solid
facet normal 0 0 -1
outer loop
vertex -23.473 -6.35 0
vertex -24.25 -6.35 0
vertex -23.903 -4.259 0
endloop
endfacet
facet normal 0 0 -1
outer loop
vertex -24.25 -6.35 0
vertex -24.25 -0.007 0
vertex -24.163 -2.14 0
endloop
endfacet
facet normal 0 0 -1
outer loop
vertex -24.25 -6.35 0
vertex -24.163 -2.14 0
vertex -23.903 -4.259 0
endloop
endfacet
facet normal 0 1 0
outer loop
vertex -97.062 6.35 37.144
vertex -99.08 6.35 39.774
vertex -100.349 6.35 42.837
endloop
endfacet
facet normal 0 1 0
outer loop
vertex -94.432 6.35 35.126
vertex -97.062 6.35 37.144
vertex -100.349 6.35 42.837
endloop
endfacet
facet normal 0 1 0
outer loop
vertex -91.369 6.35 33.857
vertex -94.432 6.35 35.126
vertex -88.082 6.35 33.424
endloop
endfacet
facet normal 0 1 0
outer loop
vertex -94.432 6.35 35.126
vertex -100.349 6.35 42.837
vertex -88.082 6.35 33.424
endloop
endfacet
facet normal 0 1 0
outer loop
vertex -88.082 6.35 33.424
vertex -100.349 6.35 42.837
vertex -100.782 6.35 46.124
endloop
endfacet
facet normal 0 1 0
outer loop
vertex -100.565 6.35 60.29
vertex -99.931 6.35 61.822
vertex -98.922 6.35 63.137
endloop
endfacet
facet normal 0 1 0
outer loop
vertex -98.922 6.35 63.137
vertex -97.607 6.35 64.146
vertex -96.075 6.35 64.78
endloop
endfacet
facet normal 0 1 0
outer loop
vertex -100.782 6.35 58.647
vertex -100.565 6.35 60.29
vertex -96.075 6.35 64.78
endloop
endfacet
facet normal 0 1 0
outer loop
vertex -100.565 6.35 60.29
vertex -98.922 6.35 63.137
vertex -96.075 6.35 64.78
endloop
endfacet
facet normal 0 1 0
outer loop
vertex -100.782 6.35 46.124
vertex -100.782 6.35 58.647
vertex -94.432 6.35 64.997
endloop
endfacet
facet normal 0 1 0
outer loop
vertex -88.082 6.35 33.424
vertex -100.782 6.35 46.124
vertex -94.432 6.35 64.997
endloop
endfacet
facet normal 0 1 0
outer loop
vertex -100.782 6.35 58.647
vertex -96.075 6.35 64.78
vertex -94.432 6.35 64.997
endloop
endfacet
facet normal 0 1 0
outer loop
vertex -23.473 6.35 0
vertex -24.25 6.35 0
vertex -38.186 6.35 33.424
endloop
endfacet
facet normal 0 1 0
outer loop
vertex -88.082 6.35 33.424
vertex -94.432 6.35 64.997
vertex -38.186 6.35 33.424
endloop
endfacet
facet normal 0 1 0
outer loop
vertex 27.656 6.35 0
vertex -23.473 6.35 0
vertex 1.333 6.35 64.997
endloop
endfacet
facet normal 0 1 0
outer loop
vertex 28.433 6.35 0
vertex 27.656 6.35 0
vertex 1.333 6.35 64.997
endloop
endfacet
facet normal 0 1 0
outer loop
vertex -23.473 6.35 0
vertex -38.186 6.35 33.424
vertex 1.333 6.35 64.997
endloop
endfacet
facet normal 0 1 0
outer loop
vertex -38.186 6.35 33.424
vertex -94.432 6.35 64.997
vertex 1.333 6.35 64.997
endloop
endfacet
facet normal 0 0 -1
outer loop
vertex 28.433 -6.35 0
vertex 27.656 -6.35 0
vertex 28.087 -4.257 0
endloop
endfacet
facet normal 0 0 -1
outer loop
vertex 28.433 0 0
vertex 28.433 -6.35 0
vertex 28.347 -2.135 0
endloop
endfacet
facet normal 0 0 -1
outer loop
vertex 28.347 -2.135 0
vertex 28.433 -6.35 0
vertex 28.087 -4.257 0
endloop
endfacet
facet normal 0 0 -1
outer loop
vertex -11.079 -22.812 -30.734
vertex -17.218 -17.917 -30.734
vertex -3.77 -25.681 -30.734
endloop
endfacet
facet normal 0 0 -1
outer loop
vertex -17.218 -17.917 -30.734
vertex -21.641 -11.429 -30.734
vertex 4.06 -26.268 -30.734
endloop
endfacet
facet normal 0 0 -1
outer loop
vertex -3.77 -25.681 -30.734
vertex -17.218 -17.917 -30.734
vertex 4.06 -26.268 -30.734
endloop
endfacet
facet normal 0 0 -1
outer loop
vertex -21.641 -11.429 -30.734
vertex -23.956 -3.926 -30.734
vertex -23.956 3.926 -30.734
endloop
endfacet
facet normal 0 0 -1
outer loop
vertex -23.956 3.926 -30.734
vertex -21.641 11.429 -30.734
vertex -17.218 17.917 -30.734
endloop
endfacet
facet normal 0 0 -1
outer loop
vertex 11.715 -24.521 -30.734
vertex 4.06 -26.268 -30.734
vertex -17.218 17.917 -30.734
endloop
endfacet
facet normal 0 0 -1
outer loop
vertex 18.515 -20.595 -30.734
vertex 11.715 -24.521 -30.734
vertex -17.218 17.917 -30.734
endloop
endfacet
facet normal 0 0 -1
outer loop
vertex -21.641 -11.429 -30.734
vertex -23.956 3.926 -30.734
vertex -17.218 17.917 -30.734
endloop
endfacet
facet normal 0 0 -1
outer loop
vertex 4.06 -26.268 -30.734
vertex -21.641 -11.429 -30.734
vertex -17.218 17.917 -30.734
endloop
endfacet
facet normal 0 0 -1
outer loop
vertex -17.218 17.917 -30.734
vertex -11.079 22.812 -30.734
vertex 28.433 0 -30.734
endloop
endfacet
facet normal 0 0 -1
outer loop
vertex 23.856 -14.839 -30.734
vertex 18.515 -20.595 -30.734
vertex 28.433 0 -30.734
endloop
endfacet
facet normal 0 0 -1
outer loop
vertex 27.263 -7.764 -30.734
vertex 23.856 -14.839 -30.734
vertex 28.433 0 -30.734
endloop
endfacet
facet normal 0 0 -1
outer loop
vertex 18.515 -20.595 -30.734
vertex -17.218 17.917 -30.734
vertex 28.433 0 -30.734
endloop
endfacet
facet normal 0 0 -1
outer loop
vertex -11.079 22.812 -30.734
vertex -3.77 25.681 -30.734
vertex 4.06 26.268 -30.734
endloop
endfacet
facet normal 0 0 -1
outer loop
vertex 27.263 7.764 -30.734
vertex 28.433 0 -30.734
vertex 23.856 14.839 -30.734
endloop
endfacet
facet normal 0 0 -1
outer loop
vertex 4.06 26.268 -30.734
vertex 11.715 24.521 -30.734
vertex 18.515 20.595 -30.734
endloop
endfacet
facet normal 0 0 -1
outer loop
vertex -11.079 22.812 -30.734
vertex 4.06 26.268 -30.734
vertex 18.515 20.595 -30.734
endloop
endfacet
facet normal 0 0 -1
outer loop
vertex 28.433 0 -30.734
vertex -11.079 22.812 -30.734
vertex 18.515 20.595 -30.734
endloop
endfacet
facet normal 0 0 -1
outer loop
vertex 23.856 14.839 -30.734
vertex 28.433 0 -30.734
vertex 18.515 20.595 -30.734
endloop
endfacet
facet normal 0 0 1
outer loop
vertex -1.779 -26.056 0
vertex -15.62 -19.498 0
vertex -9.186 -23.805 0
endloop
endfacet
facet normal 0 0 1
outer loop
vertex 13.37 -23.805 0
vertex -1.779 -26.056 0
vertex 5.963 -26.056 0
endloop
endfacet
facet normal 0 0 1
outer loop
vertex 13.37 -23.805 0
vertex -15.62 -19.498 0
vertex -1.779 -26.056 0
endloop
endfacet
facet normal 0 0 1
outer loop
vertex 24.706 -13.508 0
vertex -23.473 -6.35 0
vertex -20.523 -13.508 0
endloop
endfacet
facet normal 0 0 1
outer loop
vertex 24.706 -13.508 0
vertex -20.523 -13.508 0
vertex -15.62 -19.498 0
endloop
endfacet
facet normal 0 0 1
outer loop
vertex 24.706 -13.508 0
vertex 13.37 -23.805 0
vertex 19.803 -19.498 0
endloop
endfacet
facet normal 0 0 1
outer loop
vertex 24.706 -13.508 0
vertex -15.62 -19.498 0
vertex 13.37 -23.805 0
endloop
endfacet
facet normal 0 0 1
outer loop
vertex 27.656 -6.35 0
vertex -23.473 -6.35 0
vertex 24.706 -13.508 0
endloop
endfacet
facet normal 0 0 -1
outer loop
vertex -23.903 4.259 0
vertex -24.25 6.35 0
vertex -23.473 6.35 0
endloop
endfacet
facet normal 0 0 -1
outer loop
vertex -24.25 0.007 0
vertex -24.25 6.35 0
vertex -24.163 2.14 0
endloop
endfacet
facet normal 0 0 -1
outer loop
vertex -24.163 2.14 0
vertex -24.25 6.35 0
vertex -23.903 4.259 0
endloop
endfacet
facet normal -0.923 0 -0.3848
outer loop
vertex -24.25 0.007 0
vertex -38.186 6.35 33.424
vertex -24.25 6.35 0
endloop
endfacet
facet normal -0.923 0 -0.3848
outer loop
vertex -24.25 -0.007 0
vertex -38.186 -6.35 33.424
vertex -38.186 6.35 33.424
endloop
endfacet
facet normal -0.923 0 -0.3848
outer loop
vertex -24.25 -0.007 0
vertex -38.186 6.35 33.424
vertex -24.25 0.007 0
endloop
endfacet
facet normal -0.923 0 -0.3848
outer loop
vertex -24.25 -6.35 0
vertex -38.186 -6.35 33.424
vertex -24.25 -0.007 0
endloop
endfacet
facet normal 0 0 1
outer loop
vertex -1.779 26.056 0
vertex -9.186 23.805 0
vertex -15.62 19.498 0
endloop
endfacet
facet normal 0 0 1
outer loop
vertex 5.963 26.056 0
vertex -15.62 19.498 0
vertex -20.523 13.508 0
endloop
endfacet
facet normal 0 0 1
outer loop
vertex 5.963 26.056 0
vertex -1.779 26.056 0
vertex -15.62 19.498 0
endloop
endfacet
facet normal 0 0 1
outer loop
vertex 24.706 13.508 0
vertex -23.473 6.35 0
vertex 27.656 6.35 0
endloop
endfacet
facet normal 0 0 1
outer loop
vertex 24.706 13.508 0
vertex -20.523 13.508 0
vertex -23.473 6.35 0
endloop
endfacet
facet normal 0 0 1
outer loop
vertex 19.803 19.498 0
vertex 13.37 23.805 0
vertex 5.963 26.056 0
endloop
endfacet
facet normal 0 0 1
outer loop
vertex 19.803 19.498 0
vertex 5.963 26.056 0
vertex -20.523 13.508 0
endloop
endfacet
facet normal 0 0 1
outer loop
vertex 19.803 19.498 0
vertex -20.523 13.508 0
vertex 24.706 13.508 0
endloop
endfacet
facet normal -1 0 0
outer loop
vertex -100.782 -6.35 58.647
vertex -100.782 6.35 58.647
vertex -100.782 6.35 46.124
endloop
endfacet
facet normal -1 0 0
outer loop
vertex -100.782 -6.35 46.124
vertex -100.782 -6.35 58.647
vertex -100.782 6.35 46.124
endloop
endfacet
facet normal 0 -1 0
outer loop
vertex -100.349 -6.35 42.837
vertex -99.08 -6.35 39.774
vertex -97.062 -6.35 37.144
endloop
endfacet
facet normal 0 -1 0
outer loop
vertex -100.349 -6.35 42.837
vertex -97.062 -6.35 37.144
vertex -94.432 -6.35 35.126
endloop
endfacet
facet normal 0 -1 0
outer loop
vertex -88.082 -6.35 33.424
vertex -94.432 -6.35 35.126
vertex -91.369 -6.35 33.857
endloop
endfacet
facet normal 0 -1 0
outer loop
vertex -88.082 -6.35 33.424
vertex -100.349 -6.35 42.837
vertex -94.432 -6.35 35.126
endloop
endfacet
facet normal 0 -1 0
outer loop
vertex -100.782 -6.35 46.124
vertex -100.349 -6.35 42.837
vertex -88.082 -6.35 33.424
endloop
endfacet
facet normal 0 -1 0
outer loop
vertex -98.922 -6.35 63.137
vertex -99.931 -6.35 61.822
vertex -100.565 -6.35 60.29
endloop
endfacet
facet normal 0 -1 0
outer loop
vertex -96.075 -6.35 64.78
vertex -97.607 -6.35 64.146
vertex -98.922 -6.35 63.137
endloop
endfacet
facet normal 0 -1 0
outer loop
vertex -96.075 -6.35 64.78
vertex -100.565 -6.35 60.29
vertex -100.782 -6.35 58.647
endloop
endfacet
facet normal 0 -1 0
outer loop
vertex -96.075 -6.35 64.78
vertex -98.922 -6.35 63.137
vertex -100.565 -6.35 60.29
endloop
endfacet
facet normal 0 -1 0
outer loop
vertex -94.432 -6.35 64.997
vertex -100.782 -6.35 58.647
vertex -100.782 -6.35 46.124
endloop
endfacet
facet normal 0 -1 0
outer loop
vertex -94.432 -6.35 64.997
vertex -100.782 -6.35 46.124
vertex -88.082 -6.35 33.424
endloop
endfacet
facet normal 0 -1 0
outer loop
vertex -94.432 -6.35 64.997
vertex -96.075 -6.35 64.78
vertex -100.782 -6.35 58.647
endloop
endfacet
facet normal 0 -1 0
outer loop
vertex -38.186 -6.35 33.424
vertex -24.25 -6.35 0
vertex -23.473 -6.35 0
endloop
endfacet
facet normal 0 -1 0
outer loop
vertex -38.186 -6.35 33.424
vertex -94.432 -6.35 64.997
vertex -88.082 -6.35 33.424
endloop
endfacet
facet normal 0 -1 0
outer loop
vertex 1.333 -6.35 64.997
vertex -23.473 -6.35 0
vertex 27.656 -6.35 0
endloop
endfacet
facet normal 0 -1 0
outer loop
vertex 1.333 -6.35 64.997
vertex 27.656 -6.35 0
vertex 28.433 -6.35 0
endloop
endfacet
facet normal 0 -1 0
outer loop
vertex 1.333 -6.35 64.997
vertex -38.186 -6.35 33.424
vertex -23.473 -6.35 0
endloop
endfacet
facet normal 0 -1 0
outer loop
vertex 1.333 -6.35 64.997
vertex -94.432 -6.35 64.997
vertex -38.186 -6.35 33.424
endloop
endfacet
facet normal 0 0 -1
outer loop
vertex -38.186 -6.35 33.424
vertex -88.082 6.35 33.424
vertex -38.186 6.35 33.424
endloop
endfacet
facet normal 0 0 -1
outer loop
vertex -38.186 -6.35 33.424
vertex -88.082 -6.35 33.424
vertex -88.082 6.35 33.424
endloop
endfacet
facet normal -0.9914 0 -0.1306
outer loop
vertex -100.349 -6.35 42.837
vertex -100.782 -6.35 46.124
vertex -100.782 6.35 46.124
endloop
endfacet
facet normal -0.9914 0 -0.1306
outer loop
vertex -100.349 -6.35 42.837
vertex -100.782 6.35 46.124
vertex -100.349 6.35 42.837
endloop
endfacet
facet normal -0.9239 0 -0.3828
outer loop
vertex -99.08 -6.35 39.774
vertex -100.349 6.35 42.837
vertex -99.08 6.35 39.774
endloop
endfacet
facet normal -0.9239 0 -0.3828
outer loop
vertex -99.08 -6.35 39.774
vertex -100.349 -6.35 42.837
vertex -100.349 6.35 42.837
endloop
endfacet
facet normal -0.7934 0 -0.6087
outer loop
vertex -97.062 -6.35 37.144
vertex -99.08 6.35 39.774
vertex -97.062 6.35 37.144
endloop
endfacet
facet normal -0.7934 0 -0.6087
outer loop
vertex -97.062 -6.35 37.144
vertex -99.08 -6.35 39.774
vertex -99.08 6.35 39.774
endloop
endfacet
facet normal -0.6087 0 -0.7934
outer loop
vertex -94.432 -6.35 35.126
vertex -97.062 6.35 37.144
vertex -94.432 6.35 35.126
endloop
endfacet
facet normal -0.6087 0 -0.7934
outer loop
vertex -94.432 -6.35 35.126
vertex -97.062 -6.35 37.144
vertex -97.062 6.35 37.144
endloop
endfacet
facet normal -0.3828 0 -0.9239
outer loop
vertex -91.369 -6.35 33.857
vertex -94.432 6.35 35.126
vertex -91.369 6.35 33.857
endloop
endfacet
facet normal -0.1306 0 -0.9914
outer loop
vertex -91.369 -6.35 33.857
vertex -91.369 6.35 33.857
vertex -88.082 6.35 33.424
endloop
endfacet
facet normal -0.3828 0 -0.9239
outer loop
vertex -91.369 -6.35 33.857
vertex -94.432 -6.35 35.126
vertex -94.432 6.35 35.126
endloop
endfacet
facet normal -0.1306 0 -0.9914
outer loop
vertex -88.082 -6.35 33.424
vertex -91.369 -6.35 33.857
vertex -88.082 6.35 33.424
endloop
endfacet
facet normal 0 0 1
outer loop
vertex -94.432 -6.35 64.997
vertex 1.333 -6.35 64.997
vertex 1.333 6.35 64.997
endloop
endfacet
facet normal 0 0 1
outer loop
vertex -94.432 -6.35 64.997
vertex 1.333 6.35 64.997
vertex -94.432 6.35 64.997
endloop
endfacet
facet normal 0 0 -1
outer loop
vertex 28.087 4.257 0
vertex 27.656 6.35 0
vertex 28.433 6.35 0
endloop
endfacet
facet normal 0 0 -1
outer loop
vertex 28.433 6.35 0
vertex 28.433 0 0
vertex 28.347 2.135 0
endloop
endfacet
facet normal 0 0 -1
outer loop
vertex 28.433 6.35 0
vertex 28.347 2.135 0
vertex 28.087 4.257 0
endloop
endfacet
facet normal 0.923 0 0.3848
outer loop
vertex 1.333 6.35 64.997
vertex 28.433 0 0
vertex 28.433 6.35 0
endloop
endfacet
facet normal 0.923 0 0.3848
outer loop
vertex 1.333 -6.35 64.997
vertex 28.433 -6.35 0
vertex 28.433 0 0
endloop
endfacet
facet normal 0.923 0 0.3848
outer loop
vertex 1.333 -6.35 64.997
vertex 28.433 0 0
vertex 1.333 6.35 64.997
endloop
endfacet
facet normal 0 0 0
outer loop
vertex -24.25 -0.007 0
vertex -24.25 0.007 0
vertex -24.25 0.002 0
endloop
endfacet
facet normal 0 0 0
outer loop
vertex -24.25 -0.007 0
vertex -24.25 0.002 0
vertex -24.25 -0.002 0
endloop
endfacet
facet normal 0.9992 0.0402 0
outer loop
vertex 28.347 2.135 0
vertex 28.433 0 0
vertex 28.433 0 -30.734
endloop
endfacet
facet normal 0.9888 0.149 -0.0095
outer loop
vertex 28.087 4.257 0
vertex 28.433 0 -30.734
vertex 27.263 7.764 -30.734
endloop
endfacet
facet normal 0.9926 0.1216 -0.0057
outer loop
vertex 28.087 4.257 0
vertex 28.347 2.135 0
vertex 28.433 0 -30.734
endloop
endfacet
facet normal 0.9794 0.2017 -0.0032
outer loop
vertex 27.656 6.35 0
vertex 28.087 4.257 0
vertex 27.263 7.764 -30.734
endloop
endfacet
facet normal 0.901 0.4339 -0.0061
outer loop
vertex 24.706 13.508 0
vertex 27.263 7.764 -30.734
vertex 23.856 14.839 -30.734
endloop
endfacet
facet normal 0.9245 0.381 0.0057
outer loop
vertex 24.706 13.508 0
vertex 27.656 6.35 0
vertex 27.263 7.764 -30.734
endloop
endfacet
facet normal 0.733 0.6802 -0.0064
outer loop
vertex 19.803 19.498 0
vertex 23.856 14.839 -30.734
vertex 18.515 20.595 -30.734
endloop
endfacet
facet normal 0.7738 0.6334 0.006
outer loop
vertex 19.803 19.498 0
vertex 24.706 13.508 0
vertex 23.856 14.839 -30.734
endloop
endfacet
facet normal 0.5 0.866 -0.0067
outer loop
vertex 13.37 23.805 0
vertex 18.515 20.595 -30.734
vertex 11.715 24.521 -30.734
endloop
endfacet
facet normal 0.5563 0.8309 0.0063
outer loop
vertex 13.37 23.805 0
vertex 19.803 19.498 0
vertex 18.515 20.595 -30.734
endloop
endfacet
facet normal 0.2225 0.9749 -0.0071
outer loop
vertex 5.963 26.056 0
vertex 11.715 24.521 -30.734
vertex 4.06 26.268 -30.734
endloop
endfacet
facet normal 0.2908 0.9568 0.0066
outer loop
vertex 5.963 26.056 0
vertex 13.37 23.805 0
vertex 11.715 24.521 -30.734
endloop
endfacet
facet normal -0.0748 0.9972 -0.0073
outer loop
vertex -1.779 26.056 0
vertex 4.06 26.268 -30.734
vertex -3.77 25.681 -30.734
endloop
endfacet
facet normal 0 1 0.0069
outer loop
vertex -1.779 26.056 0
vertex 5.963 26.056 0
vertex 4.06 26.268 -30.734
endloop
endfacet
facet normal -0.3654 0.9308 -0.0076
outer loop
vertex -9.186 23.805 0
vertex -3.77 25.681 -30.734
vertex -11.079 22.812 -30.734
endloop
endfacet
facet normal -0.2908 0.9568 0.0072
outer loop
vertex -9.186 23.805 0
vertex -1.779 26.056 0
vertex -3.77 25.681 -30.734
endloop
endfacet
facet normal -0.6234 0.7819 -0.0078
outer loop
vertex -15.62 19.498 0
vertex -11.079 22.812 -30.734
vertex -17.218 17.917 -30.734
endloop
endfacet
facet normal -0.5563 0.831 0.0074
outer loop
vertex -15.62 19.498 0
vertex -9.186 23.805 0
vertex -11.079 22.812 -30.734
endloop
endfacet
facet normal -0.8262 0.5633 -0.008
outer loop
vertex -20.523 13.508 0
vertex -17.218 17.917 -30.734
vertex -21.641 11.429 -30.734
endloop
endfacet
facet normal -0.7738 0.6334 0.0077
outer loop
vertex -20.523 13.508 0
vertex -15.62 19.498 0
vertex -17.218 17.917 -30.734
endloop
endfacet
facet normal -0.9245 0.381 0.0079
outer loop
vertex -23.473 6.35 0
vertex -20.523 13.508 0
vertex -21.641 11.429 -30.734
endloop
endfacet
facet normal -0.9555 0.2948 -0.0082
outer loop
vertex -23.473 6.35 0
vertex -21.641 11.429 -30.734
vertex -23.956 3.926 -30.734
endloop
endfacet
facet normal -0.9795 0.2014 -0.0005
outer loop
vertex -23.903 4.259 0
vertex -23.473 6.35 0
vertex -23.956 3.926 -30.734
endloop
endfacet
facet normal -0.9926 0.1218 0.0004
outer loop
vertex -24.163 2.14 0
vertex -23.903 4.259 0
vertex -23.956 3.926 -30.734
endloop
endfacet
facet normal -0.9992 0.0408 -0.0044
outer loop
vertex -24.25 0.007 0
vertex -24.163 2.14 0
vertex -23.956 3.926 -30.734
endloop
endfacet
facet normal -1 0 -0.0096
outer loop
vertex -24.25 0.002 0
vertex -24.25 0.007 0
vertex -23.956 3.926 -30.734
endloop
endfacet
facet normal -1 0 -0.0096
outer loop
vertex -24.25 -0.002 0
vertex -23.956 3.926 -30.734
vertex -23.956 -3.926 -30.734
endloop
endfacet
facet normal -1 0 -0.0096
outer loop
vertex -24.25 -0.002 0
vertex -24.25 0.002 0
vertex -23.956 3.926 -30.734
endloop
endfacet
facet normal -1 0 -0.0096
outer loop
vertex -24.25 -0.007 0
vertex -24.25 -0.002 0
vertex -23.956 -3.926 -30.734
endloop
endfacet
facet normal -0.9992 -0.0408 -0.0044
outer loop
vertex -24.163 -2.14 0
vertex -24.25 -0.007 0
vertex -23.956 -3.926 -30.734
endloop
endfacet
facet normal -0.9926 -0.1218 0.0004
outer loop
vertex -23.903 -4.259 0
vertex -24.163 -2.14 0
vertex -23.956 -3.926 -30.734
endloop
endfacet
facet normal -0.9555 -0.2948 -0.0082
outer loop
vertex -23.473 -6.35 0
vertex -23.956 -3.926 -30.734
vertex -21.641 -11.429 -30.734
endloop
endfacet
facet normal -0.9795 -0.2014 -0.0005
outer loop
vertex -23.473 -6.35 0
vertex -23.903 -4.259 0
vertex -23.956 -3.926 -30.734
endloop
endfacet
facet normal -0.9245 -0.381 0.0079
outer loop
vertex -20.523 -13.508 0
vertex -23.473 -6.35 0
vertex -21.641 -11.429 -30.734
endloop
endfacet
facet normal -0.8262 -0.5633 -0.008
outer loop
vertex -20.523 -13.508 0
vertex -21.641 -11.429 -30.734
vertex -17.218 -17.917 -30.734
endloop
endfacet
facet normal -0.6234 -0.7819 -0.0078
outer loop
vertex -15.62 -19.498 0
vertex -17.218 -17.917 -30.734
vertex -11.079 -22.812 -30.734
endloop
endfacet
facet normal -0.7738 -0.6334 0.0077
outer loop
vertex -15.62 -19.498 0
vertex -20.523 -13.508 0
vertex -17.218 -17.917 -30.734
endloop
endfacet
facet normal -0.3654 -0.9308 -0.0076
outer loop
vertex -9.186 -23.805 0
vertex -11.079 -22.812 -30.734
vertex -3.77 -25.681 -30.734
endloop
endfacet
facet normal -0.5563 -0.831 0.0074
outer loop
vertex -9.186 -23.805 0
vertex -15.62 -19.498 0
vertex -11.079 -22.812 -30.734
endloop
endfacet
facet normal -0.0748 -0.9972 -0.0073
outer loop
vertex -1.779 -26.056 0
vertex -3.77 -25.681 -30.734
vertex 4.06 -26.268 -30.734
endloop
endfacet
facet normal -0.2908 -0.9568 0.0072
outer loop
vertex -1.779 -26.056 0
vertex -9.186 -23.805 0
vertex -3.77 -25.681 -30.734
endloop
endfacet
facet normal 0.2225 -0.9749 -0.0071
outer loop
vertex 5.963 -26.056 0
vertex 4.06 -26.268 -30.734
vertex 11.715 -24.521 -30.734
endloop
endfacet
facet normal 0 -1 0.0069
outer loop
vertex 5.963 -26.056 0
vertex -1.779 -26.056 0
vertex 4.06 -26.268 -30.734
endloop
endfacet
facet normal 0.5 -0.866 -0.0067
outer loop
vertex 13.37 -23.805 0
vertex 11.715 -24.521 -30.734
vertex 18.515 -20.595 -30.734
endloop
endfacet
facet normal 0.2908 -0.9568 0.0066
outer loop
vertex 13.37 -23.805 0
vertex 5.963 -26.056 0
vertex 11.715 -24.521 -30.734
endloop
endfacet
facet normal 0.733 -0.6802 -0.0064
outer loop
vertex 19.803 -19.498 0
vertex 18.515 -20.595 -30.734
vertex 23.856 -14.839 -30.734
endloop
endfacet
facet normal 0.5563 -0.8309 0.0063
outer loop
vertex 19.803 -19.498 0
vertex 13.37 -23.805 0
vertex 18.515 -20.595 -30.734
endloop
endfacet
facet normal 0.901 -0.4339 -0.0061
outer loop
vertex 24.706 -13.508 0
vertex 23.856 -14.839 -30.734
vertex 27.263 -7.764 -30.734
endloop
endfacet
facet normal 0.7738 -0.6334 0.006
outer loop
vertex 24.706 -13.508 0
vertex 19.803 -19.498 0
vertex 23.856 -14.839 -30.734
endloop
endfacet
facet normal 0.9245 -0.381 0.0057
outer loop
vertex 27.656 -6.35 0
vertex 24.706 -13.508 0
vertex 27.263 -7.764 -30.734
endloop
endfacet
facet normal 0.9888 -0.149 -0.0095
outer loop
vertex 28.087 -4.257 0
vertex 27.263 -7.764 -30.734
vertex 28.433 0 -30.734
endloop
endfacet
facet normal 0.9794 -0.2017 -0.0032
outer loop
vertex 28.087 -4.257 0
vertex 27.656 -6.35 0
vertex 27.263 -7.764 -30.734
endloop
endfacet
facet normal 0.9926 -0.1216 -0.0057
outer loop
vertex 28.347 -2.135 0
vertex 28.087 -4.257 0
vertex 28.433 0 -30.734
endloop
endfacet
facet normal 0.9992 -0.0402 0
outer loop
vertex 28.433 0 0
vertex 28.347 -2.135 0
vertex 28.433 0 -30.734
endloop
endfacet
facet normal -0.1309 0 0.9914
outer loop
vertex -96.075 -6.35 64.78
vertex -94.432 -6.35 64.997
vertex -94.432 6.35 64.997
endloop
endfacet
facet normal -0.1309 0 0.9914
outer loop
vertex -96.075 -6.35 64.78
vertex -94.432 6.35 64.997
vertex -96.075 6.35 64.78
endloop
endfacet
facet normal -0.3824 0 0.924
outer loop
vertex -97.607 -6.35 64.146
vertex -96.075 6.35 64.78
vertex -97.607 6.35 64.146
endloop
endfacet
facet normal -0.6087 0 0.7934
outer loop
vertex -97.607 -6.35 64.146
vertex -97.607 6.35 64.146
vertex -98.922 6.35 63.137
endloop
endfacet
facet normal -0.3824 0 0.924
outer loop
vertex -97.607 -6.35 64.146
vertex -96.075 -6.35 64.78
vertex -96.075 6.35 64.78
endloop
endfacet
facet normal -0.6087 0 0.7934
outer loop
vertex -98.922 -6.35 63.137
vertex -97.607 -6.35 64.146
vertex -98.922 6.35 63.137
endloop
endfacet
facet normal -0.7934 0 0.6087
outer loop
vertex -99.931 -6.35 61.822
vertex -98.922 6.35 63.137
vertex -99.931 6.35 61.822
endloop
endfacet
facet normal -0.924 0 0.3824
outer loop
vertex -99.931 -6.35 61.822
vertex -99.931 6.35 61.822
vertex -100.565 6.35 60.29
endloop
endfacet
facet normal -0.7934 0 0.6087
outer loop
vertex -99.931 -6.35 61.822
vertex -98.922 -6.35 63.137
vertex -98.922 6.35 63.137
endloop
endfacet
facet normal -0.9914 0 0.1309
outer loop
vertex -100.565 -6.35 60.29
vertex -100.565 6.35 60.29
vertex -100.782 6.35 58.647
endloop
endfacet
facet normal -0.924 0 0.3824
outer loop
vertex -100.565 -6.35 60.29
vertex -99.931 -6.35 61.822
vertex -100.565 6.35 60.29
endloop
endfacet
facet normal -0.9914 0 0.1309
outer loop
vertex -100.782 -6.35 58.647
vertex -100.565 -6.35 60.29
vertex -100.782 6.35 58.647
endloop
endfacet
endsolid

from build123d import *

# Parameters (mm, degrees)
F1_DEPTH = 6.35
F2_R     = 26.3416
F3_DEPTH = 30.734


with BuildPart() as f1:
    # F0 (on Front) → F1 (new body, symmetric)
    with BuildSketch(Plane.XZ):
        with BuildLine():
            Line((-24.249891, 0), (28.433308, 0))
            Line((28.433308, 0), (1.333008, 64.996654))
            Line((1.333008, 64.996654), (-94.431851, 64.996654))
            ThreePointArc((-94.431851, 64.996654), (-98.921979, 63.136782), (-100.781851, 58.646654))
            Line((-100.781851, 58.646654), (-100.781851, 46.1244))
            ThreePointArc((-100.781851, 46.1244), (-97.062107, 37.144144), (-88.081851, 33.4244))
            Line((-88.081851, 33.4244), (-38.186166, 33.4244))
            Line((-38.186166, 33.4244), (-24.249891, 0))
        make_face()
    extrude(amount=F1_DEPTH, both=True)

    # F2 (on Top) → F3 (join)
    with BuildSketch(Plane.XY):
        with Locations((2.091708, 0)):
            Circle(F2_R)
    extrude(amount=-F3_DEPTH)


solid = f1.part
